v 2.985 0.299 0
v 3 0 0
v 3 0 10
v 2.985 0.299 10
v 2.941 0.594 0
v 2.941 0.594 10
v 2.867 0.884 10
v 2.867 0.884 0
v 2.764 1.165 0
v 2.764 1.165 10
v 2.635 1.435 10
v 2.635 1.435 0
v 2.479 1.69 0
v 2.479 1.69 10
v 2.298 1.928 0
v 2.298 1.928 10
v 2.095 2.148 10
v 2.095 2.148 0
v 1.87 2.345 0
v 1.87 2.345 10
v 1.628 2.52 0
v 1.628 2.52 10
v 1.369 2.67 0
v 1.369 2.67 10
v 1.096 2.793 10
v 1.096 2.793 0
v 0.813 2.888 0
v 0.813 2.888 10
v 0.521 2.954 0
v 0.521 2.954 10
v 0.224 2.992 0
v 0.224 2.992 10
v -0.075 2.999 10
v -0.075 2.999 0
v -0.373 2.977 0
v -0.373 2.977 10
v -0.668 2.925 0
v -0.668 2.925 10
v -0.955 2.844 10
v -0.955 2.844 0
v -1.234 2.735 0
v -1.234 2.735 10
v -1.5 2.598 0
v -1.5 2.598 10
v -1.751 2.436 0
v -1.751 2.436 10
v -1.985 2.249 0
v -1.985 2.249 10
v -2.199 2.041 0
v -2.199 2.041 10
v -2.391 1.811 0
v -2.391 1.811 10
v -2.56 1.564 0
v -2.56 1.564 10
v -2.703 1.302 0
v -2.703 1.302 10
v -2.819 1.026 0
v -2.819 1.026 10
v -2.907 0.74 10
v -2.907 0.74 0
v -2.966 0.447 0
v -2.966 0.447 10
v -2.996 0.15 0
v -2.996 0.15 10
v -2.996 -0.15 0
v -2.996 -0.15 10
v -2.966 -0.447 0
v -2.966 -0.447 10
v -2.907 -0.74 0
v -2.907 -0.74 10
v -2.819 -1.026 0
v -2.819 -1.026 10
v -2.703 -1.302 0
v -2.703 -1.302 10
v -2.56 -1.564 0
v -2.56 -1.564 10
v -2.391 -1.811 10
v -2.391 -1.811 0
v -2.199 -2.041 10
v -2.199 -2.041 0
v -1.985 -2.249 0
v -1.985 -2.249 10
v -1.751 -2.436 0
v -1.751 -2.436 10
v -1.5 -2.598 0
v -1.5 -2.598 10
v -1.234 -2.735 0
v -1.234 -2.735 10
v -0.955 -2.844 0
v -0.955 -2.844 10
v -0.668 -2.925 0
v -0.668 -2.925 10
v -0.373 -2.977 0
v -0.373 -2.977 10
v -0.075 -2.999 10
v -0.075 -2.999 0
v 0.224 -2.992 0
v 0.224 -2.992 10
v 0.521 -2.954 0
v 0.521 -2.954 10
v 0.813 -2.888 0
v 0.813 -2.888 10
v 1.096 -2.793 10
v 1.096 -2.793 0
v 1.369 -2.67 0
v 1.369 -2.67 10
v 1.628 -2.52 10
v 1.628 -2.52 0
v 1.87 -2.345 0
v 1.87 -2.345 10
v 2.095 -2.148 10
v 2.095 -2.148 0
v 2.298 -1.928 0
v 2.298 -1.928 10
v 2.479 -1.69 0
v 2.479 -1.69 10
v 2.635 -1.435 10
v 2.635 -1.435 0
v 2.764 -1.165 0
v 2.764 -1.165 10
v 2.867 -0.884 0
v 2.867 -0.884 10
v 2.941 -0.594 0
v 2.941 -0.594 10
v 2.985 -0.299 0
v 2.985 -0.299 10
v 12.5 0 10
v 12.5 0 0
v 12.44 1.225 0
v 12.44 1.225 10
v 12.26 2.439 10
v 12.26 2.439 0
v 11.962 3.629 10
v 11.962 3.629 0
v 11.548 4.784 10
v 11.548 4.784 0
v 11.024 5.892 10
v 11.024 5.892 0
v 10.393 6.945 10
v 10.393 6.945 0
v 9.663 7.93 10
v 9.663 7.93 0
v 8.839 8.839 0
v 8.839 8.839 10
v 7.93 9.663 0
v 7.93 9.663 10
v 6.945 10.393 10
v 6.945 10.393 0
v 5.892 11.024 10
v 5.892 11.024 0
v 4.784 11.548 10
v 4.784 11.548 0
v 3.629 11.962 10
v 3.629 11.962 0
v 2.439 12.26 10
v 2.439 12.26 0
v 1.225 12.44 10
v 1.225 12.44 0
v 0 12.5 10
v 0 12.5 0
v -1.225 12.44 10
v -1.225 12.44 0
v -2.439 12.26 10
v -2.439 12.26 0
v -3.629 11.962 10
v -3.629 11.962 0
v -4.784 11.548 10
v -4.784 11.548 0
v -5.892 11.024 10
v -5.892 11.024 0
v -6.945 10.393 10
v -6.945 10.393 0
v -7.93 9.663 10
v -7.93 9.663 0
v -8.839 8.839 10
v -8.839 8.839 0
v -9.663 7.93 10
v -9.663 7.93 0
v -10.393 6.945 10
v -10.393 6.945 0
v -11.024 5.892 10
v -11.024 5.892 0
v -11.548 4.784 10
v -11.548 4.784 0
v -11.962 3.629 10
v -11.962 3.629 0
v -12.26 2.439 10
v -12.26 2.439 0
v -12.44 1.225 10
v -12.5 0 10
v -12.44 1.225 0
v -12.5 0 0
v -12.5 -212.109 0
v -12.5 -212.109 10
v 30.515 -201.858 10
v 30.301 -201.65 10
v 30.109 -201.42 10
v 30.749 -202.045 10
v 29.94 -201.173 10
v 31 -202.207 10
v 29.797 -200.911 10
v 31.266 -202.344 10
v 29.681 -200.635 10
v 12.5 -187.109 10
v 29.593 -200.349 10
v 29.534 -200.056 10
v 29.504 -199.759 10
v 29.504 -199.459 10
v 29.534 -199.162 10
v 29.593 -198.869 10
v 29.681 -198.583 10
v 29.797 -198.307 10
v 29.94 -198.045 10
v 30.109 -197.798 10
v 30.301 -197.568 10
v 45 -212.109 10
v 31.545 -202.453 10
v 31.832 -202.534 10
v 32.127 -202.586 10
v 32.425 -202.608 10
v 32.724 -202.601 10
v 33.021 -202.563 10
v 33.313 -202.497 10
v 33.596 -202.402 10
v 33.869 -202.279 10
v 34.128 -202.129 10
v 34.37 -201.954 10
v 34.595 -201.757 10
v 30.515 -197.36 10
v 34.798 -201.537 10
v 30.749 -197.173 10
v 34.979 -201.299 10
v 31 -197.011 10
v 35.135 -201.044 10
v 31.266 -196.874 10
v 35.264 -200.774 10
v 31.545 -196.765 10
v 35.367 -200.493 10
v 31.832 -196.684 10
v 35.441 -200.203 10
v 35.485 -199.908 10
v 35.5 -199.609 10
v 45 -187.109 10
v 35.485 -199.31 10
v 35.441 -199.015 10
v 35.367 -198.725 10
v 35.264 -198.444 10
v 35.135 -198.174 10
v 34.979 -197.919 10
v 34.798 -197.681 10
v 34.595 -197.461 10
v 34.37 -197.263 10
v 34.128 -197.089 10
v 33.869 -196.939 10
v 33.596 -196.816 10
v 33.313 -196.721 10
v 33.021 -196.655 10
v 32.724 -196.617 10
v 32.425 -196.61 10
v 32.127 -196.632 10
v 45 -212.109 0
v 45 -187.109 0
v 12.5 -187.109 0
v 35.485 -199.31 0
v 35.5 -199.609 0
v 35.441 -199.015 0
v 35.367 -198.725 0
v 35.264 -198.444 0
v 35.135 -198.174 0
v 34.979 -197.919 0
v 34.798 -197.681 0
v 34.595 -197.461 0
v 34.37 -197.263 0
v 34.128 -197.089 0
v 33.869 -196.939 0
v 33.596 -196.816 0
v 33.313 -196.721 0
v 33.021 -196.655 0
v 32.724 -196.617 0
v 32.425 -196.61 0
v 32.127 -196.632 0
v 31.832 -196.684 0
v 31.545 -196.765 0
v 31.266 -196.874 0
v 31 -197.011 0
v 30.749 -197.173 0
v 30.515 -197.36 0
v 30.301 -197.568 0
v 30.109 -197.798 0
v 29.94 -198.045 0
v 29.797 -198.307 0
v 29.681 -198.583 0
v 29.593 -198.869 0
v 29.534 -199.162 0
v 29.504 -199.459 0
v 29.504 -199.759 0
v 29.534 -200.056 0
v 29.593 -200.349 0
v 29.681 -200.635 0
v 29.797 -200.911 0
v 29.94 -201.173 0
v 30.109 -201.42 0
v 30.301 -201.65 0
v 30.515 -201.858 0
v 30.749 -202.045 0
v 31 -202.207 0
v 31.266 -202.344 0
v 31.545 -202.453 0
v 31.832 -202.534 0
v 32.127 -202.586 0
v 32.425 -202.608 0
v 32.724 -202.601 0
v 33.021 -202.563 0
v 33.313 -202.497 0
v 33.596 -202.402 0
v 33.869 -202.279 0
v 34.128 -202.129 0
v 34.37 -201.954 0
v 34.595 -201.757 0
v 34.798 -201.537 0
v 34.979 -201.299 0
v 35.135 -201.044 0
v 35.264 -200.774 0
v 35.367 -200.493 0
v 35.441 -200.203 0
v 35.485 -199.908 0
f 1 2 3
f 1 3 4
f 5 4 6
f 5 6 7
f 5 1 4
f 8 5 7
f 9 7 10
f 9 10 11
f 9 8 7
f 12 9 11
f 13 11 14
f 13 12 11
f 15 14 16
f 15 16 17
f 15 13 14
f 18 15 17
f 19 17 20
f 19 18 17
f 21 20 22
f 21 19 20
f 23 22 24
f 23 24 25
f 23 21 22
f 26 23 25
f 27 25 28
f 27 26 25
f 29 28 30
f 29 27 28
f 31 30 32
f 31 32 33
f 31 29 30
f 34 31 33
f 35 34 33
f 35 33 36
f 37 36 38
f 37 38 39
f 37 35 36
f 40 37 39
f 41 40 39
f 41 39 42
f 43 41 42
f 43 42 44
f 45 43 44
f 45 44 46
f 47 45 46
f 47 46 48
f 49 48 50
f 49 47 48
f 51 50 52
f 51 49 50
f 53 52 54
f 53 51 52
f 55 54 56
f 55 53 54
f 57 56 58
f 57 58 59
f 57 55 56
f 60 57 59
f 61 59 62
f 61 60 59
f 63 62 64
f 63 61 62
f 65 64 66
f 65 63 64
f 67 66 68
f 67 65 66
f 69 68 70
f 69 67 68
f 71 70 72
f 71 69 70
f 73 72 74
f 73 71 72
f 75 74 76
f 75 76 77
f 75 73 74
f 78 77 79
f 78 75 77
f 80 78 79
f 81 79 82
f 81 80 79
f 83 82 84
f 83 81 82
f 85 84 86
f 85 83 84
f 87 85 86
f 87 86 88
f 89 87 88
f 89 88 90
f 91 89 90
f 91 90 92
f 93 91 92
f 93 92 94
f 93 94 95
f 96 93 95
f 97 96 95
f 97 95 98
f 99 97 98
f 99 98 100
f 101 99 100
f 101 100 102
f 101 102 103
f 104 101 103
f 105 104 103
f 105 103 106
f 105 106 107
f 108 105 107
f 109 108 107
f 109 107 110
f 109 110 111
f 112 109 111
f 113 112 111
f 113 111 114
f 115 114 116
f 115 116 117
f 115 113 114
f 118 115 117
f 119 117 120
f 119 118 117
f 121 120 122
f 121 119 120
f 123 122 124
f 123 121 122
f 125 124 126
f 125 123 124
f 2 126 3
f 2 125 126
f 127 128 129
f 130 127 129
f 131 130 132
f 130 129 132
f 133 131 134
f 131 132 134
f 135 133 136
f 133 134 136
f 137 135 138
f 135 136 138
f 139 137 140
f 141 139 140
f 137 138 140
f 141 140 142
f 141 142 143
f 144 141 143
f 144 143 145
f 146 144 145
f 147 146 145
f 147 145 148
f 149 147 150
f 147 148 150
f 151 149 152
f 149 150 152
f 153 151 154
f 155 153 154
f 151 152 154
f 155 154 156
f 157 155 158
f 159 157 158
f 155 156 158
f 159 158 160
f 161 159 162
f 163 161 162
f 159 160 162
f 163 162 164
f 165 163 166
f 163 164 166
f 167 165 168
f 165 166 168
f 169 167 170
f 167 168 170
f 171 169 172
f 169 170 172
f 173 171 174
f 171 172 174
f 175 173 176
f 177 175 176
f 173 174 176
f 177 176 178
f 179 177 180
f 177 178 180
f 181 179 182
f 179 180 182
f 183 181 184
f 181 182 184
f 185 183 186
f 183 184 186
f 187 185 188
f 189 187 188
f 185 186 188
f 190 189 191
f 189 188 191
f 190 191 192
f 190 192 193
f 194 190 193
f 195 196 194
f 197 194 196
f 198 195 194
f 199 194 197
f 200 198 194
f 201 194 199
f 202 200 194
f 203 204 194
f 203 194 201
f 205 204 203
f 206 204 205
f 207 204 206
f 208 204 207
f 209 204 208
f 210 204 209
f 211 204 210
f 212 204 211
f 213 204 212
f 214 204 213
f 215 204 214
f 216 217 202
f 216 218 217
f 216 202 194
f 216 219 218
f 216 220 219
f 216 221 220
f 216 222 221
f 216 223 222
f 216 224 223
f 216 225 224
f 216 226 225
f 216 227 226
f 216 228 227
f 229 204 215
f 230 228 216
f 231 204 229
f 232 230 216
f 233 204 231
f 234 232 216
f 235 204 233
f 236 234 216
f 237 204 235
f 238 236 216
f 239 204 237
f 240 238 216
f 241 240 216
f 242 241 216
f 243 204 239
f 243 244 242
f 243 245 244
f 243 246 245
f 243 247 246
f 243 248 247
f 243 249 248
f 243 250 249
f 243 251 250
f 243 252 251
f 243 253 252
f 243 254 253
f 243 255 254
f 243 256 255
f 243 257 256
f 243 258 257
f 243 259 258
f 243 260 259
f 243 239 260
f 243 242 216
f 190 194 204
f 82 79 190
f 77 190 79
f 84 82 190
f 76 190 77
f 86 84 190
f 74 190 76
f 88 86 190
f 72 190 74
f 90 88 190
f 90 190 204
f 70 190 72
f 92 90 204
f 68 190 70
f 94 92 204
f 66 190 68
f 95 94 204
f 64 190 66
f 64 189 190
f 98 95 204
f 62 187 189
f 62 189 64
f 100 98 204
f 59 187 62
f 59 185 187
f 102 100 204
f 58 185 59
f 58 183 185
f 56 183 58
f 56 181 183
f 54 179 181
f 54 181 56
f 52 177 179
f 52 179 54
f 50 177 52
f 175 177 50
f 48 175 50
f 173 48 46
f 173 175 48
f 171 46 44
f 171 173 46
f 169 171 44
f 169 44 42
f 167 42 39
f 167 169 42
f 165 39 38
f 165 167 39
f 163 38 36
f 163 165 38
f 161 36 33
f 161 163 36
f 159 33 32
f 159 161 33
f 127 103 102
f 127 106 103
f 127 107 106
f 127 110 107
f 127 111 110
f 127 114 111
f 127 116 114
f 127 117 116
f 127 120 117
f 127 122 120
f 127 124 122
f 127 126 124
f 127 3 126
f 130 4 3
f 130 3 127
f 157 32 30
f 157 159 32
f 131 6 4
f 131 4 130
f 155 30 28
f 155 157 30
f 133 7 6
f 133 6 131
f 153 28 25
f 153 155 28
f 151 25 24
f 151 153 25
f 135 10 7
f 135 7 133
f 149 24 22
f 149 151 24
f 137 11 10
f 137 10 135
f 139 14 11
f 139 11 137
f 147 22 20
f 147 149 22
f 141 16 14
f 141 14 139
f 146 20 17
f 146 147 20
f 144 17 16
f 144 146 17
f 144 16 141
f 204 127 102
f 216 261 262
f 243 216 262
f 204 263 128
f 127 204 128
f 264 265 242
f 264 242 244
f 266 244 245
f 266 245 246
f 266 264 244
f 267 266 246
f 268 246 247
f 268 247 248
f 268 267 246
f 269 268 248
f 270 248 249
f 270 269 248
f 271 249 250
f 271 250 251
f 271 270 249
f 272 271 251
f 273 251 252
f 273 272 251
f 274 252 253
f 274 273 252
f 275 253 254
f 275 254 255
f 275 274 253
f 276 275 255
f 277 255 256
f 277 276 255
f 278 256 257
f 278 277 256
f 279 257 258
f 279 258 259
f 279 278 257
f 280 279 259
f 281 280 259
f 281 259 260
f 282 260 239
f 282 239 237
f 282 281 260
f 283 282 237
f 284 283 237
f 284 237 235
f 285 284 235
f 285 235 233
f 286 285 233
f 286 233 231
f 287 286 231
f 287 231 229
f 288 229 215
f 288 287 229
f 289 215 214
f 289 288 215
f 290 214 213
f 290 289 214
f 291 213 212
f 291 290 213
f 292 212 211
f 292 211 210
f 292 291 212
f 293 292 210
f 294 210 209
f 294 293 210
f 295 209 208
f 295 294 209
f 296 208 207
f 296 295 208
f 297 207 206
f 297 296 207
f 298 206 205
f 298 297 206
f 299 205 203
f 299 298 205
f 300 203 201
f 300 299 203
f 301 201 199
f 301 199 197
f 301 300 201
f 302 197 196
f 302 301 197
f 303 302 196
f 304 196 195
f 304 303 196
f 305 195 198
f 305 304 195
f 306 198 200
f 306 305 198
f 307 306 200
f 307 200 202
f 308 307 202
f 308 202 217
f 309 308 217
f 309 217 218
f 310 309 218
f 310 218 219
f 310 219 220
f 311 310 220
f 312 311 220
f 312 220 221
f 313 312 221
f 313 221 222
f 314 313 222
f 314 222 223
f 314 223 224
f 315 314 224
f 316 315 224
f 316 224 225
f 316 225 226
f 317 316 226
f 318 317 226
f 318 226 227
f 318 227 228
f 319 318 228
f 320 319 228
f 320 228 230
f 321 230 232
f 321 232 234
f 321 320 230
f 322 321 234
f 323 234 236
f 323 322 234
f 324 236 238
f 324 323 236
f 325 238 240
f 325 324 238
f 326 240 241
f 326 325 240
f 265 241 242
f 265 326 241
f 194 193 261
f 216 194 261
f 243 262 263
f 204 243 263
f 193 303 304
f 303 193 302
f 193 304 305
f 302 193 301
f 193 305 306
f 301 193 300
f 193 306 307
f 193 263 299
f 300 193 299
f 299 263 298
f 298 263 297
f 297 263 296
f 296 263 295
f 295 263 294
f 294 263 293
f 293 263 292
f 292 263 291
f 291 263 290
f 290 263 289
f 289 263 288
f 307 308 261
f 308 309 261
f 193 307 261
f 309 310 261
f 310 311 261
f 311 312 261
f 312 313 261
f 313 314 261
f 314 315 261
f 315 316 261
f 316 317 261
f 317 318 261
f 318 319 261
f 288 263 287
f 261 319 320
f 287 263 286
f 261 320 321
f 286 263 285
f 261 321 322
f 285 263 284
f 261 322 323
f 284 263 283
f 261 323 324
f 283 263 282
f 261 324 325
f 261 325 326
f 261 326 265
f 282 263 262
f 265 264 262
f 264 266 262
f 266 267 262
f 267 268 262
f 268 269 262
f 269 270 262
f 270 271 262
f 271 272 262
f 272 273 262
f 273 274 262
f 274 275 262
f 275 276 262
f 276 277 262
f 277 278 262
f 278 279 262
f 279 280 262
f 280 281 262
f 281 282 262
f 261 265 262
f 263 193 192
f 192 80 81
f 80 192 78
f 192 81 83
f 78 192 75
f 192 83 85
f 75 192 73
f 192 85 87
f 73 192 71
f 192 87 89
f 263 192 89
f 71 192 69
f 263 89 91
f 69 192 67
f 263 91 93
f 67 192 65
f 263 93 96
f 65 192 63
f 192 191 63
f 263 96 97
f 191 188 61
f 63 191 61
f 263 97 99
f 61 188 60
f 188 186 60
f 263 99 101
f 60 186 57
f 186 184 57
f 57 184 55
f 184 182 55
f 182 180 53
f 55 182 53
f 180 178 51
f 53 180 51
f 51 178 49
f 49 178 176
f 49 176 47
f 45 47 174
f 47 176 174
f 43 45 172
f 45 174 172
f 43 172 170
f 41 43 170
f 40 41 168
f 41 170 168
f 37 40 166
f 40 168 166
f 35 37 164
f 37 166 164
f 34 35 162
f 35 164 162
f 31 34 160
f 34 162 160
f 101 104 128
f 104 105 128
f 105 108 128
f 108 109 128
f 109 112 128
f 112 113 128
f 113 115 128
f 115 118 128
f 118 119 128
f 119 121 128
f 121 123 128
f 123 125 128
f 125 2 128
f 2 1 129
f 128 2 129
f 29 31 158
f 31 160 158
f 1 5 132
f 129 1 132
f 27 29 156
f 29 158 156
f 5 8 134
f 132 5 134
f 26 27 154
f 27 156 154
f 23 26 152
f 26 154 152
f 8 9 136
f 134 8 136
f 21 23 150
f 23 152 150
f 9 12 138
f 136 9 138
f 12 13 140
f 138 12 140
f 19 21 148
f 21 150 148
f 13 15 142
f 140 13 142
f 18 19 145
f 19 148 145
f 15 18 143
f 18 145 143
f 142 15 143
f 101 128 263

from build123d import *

# Parameters (mm, degrees)
SKETCH1_R           = 3
BOSS_EXTRUDE1_DEPTH = 10


with BuildPart() as part:
    # Sketch1 → Boss-Extrude1 (new body)
    with BuildSketch(Plane.XY):
        with BuildLine():
            Line((-12.5, 0), (-12.5, -212.108992783))
            Line((-12.5, -212.108992783), (45, -212.108992783))
            Line((45, -212.108992783), (45, -187.108992783))
            Line((45, -187.108992783), (12.5, -187.108992783))
            Line((12.5, -187.108992783), (12.5, 0))
            ThreePointArc((12.5, 0), (0, 12.5), (-12.5, 0))
        make_face()
        Circle(SKETCH1_R, mode=Mode.SUBTRACT)
        with Locations((32.5, -199.608992783)):
            Circle(SKETCH1_R, mode=Mode.SUBTRACT)
    extrude(amount=BOSS_EXTRUDE1_DEPTH)


solid = part.part
